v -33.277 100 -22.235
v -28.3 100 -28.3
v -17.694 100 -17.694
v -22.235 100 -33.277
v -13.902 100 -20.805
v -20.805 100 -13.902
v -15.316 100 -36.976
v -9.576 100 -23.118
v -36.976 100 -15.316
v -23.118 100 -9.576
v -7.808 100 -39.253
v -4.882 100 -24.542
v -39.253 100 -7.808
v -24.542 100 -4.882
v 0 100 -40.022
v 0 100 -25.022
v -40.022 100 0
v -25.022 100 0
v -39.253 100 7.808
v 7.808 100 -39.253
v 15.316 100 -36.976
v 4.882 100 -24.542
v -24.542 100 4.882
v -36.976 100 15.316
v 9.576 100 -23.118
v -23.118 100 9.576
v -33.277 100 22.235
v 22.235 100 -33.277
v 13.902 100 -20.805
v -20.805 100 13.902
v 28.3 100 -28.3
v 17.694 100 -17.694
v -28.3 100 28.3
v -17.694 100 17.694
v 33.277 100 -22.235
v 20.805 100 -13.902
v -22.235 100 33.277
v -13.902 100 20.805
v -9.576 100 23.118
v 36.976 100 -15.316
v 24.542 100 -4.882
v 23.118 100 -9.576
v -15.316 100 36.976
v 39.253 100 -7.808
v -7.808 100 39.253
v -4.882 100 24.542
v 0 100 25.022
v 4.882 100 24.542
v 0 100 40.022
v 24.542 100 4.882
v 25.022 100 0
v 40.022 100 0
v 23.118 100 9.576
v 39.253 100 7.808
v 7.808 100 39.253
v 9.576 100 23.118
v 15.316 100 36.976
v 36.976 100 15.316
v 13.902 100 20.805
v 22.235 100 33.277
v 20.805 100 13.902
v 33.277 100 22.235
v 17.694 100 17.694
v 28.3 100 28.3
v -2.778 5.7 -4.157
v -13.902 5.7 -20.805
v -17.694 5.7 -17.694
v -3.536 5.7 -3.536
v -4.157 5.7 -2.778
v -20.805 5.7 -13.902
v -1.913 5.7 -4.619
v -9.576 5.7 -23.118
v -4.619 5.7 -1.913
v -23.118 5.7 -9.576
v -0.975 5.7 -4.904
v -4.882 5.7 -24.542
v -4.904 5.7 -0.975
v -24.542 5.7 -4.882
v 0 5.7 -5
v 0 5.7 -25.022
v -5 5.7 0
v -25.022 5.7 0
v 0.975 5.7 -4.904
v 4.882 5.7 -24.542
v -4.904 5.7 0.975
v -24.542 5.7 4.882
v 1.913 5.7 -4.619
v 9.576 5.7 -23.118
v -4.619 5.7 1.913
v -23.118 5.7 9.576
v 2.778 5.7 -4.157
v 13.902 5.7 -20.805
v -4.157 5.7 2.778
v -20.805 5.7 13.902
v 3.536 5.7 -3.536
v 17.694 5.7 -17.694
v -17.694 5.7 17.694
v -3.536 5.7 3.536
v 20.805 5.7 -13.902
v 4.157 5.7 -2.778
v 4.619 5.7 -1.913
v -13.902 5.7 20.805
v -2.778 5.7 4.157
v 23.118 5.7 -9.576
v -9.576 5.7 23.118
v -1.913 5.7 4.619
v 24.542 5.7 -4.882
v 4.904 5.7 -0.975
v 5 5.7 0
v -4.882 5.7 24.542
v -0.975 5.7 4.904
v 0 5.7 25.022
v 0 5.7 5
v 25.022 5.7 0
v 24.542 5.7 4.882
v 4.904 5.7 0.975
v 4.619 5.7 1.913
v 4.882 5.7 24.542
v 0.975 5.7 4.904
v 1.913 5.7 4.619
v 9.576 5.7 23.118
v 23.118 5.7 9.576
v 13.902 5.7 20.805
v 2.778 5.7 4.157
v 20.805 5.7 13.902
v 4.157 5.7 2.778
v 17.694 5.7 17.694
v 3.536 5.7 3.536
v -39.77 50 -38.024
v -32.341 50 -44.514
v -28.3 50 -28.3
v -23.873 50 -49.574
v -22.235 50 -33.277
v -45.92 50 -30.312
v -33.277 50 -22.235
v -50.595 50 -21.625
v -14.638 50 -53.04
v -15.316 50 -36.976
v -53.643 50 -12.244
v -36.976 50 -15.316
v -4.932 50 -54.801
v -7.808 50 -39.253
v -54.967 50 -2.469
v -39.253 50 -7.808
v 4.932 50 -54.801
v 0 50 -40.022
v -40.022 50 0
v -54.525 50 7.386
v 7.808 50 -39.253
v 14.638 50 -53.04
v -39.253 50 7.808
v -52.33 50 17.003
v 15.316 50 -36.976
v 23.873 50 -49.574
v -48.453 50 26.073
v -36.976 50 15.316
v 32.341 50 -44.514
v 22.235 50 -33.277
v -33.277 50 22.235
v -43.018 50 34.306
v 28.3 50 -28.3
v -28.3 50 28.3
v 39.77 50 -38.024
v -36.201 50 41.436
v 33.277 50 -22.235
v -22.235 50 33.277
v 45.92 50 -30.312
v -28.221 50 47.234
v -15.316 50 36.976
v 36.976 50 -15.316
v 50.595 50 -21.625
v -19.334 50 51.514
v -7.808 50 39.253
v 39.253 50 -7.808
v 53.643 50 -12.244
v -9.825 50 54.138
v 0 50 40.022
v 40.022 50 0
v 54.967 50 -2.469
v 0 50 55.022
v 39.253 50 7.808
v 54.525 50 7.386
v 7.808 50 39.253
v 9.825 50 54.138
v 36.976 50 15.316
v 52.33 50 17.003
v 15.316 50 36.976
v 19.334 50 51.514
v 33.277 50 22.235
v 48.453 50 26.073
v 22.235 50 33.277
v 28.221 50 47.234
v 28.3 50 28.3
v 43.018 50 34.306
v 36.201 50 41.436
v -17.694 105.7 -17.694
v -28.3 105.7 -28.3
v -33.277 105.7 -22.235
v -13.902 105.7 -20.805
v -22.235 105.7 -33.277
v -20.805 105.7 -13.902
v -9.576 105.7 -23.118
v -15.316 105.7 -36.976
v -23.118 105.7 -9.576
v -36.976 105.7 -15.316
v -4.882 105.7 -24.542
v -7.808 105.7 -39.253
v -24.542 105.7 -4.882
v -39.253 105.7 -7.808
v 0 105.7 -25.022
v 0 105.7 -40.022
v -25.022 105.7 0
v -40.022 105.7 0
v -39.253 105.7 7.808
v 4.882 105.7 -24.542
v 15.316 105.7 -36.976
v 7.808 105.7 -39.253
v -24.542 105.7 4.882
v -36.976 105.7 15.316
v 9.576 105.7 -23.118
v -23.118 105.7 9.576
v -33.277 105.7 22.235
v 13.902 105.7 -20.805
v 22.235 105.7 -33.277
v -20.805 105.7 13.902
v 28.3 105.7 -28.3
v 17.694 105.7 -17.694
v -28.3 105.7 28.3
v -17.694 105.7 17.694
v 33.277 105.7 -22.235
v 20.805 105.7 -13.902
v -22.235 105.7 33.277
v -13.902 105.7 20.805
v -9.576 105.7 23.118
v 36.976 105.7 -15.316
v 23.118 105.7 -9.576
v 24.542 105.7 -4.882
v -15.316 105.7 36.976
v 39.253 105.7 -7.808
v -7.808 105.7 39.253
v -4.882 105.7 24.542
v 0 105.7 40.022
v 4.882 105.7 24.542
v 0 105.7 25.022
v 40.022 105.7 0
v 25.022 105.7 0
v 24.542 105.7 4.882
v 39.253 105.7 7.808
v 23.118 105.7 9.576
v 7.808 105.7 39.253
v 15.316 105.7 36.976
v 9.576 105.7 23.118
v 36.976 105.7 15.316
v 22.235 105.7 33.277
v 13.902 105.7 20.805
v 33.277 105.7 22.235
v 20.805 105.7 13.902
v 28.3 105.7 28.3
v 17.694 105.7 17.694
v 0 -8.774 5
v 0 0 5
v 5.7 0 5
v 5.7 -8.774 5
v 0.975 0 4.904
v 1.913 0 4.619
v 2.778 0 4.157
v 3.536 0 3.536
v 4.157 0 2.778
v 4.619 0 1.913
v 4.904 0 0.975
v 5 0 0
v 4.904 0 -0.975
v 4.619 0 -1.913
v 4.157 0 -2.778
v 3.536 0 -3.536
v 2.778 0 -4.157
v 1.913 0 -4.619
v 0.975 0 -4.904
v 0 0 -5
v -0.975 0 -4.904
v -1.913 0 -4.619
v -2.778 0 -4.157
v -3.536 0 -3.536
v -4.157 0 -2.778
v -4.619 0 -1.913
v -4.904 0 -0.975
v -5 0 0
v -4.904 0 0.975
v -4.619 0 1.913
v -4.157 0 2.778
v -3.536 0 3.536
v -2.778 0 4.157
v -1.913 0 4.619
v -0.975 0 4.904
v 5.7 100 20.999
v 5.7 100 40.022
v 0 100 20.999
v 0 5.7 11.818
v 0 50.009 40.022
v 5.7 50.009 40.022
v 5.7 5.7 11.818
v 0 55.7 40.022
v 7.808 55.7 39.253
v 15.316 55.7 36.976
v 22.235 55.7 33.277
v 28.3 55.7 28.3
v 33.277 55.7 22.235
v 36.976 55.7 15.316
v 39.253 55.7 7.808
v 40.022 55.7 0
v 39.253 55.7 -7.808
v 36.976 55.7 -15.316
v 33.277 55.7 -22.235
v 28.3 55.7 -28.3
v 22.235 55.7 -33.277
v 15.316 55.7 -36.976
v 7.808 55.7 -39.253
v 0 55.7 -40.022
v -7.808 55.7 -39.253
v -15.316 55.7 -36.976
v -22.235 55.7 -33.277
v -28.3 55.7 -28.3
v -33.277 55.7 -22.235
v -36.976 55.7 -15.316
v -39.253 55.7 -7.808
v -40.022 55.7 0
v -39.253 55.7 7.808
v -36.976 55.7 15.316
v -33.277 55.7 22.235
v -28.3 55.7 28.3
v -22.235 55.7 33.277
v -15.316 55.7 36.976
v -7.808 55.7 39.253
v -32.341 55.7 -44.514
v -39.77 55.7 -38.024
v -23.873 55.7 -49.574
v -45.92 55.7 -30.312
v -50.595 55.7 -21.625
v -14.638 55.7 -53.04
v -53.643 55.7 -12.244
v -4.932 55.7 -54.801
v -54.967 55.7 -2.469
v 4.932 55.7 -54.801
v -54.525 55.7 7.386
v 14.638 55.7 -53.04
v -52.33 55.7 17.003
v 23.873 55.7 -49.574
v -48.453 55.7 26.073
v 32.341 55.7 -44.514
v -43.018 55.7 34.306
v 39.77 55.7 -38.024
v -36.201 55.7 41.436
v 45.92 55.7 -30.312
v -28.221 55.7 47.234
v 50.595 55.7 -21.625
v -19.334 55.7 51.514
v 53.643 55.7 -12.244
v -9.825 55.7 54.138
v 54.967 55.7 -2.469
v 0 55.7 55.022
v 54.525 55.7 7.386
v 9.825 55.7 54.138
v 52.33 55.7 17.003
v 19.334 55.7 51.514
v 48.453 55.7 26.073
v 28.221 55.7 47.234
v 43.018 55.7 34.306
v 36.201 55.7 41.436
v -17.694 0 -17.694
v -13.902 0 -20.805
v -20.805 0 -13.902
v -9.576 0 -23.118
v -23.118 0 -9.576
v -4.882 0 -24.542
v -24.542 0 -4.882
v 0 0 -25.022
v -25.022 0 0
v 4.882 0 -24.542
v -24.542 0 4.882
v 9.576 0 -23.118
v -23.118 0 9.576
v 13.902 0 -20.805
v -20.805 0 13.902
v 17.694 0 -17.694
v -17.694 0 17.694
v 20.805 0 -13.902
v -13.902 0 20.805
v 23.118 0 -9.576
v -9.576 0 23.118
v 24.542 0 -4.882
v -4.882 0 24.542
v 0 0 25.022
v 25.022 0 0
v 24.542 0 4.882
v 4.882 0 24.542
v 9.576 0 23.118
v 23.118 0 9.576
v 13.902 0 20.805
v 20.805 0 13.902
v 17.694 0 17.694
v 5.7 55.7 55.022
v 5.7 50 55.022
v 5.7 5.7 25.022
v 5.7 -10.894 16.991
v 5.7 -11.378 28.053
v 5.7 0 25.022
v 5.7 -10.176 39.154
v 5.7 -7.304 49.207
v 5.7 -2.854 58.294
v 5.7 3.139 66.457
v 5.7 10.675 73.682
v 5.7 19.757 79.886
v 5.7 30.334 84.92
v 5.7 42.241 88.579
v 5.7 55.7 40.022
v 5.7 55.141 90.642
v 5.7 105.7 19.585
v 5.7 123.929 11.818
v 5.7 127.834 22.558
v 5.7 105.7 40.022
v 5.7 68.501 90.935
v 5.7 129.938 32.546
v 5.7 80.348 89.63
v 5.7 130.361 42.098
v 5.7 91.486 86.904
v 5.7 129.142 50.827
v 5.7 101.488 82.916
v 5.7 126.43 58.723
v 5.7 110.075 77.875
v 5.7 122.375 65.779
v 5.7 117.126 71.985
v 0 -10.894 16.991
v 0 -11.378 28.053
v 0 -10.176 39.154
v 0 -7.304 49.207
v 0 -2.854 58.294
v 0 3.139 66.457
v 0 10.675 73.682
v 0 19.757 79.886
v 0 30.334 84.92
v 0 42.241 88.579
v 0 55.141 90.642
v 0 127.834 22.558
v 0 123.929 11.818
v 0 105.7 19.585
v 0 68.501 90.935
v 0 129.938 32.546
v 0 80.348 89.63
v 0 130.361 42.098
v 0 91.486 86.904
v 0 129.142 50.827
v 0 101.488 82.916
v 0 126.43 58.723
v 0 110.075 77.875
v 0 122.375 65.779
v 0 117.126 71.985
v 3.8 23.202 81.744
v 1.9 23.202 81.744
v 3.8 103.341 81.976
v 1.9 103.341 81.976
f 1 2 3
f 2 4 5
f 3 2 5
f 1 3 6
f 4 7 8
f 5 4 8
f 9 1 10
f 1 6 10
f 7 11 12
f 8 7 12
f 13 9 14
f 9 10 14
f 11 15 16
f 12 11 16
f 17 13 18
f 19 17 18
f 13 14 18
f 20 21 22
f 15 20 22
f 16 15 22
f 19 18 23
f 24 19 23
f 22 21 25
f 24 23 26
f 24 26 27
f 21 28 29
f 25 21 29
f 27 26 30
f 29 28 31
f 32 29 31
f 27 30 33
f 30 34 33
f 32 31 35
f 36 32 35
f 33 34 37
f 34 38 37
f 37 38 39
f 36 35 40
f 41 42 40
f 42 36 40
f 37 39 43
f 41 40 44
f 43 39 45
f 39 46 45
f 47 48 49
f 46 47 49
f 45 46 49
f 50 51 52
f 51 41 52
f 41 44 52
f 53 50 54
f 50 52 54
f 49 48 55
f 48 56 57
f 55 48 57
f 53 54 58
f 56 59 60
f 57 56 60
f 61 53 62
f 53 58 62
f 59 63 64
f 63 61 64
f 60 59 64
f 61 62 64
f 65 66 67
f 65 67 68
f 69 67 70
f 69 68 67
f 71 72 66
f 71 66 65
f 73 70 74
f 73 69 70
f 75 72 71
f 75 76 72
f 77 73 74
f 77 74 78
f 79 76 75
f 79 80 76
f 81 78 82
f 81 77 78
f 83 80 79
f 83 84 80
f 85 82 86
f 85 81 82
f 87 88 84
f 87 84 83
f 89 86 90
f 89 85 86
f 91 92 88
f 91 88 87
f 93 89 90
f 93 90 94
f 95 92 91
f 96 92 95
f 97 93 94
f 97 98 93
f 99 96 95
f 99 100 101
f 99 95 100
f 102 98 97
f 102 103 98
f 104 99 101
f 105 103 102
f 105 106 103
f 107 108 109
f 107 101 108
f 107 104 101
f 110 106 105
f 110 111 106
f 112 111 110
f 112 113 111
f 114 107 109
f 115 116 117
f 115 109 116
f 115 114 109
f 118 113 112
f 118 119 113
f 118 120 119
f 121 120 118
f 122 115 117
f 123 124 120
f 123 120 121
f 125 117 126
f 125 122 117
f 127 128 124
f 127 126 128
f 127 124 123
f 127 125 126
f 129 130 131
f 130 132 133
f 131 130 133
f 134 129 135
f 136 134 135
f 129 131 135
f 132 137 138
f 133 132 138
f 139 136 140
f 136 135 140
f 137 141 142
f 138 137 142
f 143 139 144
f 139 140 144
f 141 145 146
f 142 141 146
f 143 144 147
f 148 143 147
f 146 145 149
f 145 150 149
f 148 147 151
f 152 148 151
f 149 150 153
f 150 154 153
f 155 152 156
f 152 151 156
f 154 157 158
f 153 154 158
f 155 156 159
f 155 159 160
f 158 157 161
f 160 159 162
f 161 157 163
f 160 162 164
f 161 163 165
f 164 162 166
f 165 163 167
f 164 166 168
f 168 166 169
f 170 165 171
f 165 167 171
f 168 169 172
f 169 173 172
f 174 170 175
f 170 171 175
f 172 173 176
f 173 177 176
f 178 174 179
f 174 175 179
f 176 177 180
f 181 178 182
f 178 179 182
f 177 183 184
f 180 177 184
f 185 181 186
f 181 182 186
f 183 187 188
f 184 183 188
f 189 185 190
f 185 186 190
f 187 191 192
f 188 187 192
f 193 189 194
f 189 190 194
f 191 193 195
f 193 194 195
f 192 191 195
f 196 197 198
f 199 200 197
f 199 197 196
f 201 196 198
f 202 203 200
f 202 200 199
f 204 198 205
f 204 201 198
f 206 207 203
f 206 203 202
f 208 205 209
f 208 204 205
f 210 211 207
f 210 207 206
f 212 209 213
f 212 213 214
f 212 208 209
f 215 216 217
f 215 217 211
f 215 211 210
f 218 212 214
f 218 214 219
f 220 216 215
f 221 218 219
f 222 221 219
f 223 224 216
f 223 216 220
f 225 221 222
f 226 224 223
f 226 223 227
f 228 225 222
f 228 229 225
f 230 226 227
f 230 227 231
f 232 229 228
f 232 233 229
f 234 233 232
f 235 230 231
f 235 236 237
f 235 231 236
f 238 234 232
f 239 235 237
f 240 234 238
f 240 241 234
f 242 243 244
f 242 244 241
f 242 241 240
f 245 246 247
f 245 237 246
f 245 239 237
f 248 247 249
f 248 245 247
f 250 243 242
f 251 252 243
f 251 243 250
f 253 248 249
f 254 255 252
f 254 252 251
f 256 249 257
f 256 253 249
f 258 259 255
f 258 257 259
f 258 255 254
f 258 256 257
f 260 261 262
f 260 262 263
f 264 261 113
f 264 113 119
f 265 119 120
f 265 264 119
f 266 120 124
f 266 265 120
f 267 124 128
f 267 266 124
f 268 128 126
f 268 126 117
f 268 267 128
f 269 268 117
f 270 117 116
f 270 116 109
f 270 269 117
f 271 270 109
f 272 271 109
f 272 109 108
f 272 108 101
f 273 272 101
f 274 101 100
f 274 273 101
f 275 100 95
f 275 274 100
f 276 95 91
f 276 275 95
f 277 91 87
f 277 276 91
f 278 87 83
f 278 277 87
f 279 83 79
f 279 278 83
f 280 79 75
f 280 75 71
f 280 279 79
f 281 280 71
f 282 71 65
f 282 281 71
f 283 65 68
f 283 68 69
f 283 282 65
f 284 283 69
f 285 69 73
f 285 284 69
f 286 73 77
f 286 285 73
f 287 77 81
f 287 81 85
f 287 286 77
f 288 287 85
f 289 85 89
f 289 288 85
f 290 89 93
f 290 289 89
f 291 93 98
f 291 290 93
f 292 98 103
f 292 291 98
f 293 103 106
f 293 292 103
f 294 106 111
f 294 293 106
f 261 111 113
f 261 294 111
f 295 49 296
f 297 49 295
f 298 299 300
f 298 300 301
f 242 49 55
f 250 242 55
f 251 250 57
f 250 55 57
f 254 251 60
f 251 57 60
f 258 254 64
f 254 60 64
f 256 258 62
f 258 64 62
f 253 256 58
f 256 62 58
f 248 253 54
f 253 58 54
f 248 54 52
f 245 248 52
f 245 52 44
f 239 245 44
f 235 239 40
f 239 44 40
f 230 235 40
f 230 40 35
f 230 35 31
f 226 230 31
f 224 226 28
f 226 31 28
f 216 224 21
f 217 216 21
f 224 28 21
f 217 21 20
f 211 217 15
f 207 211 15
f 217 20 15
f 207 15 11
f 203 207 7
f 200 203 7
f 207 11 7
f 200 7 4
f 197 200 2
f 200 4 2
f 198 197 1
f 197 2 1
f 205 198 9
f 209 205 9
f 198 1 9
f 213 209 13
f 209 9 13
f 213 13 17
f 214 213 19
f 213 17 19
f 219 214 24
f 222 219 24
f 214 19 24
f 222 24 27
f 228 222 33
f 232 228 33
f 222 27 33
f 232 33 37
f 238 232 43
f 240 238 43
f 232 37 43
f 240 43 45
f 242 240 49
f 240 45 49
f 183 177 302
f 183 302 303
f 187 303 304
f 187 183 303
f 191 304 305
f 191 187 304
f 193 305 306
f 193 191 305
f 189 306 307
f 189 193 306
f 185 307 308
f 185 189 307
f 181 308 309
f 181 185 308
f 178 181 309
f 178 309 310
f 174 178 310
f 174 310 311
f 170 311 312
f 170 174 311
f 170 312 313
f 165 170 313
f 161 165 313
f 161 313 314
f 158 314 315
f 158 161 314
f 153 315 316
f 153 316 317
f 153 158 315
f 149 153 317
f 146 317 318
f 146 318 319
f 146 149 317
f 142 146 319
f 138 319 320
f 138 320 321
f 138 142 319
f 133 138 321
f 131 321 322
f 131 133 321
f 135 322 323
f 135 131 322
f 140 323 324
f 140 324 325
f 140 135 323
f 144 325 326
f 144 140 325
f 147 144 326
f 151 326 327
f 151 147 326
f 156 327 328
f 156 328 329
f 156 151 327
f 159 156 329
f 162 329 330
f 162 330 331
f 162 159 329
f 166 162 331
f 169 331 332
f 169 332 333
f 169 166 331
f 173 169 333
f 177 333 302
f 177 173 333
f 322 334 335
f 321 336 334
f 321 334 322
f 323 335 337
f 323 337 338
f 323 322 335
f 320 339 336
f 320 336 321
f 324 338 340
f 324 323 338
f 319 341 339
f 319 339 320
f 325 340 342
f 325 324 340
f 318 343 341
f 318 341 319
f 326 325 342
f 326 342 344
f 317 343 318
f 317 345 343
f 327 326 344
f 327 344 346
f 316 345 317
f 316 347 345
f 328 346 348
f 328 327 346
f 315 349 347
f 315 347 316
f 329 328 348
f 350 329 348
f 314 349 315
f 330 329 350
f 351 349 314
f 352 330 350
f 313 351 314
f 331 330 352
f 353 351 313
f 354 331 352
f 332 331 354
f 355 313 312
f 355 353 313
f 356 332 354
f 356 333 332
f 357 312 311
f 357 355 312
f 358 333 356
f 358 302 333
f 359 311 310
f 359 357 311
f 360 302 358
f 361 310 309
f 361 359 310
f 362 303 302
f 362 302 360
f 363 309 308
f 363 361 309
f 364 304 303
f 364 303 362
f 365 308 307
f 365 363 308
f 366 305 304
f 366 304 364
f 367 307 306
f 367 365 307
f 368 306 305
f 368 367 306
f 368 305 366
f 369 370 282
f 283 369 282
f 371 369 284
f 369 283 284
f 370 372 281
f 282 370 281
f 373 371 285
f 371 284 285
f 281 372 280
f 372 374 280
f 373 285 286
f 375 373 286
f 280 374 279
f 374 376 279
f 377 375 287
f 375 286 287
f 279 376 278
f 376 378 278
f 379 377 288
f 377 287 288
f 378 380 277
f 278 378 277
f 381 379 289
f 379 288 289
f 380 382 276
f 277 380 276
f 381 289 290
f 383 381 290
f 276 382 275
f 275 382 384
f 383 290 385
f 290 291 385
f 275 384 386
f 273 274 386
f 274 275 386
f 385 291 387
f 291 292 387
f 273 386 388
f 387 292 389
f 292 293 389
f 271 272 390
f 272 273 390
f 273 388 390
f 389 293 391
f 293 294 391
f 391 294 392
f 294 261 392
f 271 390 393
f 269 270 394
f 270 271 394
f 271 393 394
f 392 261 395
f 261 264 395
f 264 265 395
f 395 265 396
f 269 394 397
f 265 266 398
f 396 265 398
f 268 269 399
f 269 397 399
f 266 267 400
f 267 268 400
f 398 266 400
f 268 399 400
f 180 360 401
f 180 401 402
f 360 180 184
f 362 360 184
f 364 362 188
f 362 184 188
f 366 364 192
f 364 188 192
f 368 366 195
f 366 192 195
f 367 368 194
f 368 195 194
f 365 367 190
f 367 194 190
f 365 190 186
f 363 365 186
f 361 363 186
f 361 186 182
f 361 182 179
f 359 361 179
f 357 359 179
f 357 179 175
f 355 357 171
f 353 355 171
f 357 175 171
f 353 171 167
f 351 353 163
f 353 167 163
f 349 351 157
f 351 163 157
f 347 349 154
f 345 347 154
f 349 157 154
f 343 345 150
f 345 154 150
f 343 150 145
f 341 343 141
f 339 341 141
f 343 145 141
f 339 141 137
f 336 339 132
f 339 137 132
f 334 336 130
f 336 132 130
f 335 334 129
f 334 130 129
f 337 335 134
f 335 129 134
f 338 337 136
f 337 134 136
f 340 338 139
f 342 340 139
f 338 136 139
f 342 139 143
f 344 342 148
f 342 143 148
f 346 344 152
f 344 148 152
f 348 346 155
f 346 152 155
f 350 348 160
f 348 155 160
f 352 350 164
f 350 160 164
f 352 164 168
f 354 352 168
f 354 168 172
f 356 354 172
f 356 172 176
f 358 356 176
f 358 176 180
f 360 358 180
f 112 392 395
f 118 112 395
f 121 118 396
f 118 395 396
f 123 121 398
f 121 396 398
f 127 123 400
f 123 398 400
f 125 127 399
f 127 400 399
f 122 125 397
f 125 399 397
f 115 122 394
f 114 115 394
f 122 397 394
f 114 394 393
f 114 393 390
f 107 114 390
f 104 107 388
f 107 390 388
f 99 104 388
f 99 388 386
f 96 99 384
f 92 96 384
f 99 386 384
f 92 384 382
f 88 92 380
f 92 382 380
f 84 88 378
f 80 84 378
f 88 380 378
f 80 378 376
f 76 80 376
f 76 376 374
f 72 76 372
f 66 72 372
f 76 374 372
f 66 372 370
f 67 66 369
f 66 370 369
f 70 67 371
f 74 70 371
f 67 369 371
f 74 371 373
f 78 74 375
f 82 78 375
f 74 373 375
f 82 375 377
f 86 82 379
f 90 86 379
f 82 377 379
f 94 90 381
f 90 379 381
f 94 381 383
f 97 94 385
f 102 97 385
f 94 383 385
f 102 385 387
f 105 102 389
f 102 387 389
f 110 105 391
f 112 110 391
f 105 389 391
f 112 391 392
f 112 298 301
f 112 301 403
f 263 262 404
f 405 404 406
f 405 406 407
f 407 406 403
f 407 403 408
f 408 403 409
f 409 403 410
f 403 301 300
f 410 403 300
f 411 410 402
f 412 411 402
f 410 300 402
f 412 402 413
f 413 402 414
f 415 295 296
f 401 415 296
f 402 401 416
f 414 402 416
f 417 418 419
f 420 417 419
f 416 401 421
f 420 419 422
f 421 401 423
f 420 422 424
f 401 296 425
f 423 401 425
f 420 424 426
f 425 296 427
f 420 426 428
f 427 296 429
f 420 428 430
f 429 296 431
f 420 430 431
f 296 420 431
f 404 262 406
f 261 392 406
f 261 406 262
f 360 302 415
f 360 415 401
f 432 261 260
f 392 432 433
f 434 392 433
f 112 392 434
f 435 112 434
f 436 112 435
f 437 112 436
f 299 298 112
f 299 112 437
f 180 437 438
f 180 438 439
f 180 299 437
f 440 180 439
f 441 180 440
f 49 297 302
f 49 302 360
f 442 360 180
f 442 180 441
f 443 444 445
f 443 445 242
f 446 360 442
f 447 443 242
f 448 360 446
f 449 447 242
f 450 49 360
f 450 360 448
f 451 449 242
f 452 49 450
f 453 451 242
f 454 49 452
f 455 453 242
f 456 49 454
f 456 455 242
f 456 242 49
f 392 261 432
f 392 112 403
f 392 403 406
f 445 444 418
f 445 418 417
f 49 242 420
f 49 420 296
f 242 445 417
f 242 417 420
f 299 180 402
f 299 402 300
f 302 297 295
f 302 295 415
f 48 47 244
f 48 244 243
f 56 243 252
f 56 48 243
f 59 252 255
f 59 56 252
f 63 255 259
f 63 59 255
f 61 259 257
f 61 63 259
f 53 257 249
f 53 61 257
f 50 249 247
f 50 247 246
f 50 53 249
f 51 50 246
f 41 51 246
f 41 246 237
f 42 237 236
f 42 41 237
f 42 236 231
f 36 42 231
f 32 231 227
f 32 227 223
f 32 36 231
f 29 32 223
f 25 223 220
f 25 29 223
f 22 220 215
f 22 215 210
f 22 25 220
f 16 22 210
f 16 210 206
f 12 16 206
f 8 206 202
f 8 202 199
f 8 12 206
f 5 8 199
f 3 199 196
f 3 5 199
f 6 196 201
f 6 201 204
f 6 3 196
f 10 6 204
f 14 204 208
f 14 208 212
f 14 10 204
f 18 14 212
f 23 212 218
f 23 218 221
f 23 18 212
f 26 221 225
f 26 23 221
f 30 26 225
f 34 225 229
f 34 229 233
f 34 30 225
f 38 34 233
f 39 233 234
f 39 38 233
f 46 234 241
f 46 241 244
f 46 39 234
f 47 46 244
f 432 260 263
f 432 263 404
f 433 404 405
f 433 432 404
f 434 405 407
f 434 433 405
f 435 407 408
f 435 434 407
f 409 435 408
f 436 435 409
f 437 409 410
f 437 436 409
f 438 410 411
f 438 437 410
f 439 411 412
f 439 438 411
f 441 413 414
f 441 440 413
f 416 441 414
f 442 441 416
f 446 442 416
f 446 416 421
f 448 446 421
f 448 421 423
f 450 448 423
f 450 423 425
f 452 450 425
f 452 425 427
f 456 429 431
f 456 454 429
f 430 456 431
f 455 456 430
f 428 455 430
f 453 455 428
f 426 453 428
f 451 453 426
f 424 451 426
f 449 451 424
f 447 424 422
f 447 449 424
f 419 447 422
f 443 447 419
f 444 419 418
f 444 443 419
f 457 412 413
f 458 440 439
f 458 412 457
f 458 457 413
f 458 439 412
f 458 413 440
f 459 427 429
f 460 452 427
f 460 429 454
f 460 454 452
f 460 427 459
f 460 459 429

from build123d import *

# Parameters (mm, degrees)
SCHIZZO2_R                    = 25.0225
SCHIZZO2_R_2                  = 5
ESTRUSIONE_ESTRUSIONE1_DEPTH  = 5.7
SCHIZZO3_R                    = 55.0225
SCHIZZO3_R_2                  = 40.0225
ESTRUSIONE_ESTRUSIONE2_DEPTH  = 5.7
SCHIZZO4_R                    = 40.0225
SCHIZZO4_R_2                  = 25.0225
ESTRUSIONE_ESTRUSIONE3_DEPTH  = 5.7
ESTRUSIONE_ESTRUSIONE10_DEPTH = 5.7


with BuildPart() as part:
    # Schizzo2 → Estrusione-Estrusione1 (new body)
    with BuildSketch(Plane(origin=(0, 0, 0), x_dir=(1, 0, 0), z_dir=(0, 1, 0))):
        with Locations(Location((0, 0, 0), (0, 0, 270))):
            Circle(SCHIZZO2_R)
        with Locations(Location((0, 0, 0), (0, 0, 270))):
            Circle(SCHIZZO2_R_2, mode=Mode.SUBTRACT)
    extrude(amount=ESTRUSIONE_ESTRUSIONE1_DEPTH)


with BuildPart() as body_2:
    # Schizzo3 → Estrusione-Estrusione2 (new body)
    with BuildSketch(Plane(origin=(0, 50, 0), x_dir=(1, 0, 0), z_dir=(0, 1, 0))):
        with Locations(Location((0, 0, 0), (0, 0, 270))):
            Circle(SCHIZZO3_R)
        with Locations(Location((0, 0, 0), (0, 0, 270))):
            Circle(SCHIZZO3_R_2, mode=Mode.SUBTRACT)
    extrude(amount=ESTRUSIONE_ESTRUSIONE2_DEPTH)


with BuildPart() as body_3:
    # Schizzo4 → Estrusione-Estrusione3 (new body)
    with BuildSketch(Plane(origin=(0, 100, 0), x_dir=(1, 0, 0), z_dir=(0, 1, 0))):
        with Locations(Location((0, 0, 0), (0, 0, 270))):
            Circle(SCHIZZO4_R)
        with Locations(Location((0, 0, 0), (0, 0, 270))):
            Circle(SCHIZZO4_R_2, mode=Mode.SUBTRACT)
    extrude(amount=ESTRUSIONE_ESTRUSIONE3_DEPTH)


with BuildPart() as body_4:
    # Schizzo5 → Estrusione-Estrusione10 (new body)
    with BuildSketch(Plane(origin=(0, 0, 0), x_dir=(0, 0, -1), z_dir=(1, 0, 0))):
        with BuildLine():
            Line((-5, 0), (-5, -8.774122143))
            add(Edge.make_bspline(
                [(-5, -8.774122143), (-122.039878304, -36.784583812), (-115.130671173, 169.022277049), (-11.818324795, 123.928781979)],
                knots=[0, 0, 0, 0, 1, 1, 1, 1], degree=3))
            Line((-11.818324795, 123.928781979), (-19.584652517, 105.7))
            Line((-19.584652517, 105.7), (-40.0225, 105.7))
            Line((-40.0225, 105.7), (-40.0225, 100))
            Line((-40.0225, 100), (-20.998922906, 100))
            Line((-20.998922906, 100), (-40.0225, 55.7))
            Line((-40.0225, 55.7), (-55.0225, 55.7))
            Line((-55.0225, 55.7), (-55.0225, 50))
            Line((-55.0225, 50), (-40.0225, 50.008559229))
            Line((-40.0225, 50.008559229), (-11.818324795, 5.7))
            Line((-11.818324795, 5.7), (-25.0225, 5.7))
            Line((-25.0225, 5.7), (-25.0225, 0))
            Line((-25.0225, 0), (-5, 0))
        make_face()
    extrude(amount=ESTRUSIONE_ESTRUSIONE10_DEPTH)


solid = Compound([part.part, body_2.part, body_3.part, body_4.part])
